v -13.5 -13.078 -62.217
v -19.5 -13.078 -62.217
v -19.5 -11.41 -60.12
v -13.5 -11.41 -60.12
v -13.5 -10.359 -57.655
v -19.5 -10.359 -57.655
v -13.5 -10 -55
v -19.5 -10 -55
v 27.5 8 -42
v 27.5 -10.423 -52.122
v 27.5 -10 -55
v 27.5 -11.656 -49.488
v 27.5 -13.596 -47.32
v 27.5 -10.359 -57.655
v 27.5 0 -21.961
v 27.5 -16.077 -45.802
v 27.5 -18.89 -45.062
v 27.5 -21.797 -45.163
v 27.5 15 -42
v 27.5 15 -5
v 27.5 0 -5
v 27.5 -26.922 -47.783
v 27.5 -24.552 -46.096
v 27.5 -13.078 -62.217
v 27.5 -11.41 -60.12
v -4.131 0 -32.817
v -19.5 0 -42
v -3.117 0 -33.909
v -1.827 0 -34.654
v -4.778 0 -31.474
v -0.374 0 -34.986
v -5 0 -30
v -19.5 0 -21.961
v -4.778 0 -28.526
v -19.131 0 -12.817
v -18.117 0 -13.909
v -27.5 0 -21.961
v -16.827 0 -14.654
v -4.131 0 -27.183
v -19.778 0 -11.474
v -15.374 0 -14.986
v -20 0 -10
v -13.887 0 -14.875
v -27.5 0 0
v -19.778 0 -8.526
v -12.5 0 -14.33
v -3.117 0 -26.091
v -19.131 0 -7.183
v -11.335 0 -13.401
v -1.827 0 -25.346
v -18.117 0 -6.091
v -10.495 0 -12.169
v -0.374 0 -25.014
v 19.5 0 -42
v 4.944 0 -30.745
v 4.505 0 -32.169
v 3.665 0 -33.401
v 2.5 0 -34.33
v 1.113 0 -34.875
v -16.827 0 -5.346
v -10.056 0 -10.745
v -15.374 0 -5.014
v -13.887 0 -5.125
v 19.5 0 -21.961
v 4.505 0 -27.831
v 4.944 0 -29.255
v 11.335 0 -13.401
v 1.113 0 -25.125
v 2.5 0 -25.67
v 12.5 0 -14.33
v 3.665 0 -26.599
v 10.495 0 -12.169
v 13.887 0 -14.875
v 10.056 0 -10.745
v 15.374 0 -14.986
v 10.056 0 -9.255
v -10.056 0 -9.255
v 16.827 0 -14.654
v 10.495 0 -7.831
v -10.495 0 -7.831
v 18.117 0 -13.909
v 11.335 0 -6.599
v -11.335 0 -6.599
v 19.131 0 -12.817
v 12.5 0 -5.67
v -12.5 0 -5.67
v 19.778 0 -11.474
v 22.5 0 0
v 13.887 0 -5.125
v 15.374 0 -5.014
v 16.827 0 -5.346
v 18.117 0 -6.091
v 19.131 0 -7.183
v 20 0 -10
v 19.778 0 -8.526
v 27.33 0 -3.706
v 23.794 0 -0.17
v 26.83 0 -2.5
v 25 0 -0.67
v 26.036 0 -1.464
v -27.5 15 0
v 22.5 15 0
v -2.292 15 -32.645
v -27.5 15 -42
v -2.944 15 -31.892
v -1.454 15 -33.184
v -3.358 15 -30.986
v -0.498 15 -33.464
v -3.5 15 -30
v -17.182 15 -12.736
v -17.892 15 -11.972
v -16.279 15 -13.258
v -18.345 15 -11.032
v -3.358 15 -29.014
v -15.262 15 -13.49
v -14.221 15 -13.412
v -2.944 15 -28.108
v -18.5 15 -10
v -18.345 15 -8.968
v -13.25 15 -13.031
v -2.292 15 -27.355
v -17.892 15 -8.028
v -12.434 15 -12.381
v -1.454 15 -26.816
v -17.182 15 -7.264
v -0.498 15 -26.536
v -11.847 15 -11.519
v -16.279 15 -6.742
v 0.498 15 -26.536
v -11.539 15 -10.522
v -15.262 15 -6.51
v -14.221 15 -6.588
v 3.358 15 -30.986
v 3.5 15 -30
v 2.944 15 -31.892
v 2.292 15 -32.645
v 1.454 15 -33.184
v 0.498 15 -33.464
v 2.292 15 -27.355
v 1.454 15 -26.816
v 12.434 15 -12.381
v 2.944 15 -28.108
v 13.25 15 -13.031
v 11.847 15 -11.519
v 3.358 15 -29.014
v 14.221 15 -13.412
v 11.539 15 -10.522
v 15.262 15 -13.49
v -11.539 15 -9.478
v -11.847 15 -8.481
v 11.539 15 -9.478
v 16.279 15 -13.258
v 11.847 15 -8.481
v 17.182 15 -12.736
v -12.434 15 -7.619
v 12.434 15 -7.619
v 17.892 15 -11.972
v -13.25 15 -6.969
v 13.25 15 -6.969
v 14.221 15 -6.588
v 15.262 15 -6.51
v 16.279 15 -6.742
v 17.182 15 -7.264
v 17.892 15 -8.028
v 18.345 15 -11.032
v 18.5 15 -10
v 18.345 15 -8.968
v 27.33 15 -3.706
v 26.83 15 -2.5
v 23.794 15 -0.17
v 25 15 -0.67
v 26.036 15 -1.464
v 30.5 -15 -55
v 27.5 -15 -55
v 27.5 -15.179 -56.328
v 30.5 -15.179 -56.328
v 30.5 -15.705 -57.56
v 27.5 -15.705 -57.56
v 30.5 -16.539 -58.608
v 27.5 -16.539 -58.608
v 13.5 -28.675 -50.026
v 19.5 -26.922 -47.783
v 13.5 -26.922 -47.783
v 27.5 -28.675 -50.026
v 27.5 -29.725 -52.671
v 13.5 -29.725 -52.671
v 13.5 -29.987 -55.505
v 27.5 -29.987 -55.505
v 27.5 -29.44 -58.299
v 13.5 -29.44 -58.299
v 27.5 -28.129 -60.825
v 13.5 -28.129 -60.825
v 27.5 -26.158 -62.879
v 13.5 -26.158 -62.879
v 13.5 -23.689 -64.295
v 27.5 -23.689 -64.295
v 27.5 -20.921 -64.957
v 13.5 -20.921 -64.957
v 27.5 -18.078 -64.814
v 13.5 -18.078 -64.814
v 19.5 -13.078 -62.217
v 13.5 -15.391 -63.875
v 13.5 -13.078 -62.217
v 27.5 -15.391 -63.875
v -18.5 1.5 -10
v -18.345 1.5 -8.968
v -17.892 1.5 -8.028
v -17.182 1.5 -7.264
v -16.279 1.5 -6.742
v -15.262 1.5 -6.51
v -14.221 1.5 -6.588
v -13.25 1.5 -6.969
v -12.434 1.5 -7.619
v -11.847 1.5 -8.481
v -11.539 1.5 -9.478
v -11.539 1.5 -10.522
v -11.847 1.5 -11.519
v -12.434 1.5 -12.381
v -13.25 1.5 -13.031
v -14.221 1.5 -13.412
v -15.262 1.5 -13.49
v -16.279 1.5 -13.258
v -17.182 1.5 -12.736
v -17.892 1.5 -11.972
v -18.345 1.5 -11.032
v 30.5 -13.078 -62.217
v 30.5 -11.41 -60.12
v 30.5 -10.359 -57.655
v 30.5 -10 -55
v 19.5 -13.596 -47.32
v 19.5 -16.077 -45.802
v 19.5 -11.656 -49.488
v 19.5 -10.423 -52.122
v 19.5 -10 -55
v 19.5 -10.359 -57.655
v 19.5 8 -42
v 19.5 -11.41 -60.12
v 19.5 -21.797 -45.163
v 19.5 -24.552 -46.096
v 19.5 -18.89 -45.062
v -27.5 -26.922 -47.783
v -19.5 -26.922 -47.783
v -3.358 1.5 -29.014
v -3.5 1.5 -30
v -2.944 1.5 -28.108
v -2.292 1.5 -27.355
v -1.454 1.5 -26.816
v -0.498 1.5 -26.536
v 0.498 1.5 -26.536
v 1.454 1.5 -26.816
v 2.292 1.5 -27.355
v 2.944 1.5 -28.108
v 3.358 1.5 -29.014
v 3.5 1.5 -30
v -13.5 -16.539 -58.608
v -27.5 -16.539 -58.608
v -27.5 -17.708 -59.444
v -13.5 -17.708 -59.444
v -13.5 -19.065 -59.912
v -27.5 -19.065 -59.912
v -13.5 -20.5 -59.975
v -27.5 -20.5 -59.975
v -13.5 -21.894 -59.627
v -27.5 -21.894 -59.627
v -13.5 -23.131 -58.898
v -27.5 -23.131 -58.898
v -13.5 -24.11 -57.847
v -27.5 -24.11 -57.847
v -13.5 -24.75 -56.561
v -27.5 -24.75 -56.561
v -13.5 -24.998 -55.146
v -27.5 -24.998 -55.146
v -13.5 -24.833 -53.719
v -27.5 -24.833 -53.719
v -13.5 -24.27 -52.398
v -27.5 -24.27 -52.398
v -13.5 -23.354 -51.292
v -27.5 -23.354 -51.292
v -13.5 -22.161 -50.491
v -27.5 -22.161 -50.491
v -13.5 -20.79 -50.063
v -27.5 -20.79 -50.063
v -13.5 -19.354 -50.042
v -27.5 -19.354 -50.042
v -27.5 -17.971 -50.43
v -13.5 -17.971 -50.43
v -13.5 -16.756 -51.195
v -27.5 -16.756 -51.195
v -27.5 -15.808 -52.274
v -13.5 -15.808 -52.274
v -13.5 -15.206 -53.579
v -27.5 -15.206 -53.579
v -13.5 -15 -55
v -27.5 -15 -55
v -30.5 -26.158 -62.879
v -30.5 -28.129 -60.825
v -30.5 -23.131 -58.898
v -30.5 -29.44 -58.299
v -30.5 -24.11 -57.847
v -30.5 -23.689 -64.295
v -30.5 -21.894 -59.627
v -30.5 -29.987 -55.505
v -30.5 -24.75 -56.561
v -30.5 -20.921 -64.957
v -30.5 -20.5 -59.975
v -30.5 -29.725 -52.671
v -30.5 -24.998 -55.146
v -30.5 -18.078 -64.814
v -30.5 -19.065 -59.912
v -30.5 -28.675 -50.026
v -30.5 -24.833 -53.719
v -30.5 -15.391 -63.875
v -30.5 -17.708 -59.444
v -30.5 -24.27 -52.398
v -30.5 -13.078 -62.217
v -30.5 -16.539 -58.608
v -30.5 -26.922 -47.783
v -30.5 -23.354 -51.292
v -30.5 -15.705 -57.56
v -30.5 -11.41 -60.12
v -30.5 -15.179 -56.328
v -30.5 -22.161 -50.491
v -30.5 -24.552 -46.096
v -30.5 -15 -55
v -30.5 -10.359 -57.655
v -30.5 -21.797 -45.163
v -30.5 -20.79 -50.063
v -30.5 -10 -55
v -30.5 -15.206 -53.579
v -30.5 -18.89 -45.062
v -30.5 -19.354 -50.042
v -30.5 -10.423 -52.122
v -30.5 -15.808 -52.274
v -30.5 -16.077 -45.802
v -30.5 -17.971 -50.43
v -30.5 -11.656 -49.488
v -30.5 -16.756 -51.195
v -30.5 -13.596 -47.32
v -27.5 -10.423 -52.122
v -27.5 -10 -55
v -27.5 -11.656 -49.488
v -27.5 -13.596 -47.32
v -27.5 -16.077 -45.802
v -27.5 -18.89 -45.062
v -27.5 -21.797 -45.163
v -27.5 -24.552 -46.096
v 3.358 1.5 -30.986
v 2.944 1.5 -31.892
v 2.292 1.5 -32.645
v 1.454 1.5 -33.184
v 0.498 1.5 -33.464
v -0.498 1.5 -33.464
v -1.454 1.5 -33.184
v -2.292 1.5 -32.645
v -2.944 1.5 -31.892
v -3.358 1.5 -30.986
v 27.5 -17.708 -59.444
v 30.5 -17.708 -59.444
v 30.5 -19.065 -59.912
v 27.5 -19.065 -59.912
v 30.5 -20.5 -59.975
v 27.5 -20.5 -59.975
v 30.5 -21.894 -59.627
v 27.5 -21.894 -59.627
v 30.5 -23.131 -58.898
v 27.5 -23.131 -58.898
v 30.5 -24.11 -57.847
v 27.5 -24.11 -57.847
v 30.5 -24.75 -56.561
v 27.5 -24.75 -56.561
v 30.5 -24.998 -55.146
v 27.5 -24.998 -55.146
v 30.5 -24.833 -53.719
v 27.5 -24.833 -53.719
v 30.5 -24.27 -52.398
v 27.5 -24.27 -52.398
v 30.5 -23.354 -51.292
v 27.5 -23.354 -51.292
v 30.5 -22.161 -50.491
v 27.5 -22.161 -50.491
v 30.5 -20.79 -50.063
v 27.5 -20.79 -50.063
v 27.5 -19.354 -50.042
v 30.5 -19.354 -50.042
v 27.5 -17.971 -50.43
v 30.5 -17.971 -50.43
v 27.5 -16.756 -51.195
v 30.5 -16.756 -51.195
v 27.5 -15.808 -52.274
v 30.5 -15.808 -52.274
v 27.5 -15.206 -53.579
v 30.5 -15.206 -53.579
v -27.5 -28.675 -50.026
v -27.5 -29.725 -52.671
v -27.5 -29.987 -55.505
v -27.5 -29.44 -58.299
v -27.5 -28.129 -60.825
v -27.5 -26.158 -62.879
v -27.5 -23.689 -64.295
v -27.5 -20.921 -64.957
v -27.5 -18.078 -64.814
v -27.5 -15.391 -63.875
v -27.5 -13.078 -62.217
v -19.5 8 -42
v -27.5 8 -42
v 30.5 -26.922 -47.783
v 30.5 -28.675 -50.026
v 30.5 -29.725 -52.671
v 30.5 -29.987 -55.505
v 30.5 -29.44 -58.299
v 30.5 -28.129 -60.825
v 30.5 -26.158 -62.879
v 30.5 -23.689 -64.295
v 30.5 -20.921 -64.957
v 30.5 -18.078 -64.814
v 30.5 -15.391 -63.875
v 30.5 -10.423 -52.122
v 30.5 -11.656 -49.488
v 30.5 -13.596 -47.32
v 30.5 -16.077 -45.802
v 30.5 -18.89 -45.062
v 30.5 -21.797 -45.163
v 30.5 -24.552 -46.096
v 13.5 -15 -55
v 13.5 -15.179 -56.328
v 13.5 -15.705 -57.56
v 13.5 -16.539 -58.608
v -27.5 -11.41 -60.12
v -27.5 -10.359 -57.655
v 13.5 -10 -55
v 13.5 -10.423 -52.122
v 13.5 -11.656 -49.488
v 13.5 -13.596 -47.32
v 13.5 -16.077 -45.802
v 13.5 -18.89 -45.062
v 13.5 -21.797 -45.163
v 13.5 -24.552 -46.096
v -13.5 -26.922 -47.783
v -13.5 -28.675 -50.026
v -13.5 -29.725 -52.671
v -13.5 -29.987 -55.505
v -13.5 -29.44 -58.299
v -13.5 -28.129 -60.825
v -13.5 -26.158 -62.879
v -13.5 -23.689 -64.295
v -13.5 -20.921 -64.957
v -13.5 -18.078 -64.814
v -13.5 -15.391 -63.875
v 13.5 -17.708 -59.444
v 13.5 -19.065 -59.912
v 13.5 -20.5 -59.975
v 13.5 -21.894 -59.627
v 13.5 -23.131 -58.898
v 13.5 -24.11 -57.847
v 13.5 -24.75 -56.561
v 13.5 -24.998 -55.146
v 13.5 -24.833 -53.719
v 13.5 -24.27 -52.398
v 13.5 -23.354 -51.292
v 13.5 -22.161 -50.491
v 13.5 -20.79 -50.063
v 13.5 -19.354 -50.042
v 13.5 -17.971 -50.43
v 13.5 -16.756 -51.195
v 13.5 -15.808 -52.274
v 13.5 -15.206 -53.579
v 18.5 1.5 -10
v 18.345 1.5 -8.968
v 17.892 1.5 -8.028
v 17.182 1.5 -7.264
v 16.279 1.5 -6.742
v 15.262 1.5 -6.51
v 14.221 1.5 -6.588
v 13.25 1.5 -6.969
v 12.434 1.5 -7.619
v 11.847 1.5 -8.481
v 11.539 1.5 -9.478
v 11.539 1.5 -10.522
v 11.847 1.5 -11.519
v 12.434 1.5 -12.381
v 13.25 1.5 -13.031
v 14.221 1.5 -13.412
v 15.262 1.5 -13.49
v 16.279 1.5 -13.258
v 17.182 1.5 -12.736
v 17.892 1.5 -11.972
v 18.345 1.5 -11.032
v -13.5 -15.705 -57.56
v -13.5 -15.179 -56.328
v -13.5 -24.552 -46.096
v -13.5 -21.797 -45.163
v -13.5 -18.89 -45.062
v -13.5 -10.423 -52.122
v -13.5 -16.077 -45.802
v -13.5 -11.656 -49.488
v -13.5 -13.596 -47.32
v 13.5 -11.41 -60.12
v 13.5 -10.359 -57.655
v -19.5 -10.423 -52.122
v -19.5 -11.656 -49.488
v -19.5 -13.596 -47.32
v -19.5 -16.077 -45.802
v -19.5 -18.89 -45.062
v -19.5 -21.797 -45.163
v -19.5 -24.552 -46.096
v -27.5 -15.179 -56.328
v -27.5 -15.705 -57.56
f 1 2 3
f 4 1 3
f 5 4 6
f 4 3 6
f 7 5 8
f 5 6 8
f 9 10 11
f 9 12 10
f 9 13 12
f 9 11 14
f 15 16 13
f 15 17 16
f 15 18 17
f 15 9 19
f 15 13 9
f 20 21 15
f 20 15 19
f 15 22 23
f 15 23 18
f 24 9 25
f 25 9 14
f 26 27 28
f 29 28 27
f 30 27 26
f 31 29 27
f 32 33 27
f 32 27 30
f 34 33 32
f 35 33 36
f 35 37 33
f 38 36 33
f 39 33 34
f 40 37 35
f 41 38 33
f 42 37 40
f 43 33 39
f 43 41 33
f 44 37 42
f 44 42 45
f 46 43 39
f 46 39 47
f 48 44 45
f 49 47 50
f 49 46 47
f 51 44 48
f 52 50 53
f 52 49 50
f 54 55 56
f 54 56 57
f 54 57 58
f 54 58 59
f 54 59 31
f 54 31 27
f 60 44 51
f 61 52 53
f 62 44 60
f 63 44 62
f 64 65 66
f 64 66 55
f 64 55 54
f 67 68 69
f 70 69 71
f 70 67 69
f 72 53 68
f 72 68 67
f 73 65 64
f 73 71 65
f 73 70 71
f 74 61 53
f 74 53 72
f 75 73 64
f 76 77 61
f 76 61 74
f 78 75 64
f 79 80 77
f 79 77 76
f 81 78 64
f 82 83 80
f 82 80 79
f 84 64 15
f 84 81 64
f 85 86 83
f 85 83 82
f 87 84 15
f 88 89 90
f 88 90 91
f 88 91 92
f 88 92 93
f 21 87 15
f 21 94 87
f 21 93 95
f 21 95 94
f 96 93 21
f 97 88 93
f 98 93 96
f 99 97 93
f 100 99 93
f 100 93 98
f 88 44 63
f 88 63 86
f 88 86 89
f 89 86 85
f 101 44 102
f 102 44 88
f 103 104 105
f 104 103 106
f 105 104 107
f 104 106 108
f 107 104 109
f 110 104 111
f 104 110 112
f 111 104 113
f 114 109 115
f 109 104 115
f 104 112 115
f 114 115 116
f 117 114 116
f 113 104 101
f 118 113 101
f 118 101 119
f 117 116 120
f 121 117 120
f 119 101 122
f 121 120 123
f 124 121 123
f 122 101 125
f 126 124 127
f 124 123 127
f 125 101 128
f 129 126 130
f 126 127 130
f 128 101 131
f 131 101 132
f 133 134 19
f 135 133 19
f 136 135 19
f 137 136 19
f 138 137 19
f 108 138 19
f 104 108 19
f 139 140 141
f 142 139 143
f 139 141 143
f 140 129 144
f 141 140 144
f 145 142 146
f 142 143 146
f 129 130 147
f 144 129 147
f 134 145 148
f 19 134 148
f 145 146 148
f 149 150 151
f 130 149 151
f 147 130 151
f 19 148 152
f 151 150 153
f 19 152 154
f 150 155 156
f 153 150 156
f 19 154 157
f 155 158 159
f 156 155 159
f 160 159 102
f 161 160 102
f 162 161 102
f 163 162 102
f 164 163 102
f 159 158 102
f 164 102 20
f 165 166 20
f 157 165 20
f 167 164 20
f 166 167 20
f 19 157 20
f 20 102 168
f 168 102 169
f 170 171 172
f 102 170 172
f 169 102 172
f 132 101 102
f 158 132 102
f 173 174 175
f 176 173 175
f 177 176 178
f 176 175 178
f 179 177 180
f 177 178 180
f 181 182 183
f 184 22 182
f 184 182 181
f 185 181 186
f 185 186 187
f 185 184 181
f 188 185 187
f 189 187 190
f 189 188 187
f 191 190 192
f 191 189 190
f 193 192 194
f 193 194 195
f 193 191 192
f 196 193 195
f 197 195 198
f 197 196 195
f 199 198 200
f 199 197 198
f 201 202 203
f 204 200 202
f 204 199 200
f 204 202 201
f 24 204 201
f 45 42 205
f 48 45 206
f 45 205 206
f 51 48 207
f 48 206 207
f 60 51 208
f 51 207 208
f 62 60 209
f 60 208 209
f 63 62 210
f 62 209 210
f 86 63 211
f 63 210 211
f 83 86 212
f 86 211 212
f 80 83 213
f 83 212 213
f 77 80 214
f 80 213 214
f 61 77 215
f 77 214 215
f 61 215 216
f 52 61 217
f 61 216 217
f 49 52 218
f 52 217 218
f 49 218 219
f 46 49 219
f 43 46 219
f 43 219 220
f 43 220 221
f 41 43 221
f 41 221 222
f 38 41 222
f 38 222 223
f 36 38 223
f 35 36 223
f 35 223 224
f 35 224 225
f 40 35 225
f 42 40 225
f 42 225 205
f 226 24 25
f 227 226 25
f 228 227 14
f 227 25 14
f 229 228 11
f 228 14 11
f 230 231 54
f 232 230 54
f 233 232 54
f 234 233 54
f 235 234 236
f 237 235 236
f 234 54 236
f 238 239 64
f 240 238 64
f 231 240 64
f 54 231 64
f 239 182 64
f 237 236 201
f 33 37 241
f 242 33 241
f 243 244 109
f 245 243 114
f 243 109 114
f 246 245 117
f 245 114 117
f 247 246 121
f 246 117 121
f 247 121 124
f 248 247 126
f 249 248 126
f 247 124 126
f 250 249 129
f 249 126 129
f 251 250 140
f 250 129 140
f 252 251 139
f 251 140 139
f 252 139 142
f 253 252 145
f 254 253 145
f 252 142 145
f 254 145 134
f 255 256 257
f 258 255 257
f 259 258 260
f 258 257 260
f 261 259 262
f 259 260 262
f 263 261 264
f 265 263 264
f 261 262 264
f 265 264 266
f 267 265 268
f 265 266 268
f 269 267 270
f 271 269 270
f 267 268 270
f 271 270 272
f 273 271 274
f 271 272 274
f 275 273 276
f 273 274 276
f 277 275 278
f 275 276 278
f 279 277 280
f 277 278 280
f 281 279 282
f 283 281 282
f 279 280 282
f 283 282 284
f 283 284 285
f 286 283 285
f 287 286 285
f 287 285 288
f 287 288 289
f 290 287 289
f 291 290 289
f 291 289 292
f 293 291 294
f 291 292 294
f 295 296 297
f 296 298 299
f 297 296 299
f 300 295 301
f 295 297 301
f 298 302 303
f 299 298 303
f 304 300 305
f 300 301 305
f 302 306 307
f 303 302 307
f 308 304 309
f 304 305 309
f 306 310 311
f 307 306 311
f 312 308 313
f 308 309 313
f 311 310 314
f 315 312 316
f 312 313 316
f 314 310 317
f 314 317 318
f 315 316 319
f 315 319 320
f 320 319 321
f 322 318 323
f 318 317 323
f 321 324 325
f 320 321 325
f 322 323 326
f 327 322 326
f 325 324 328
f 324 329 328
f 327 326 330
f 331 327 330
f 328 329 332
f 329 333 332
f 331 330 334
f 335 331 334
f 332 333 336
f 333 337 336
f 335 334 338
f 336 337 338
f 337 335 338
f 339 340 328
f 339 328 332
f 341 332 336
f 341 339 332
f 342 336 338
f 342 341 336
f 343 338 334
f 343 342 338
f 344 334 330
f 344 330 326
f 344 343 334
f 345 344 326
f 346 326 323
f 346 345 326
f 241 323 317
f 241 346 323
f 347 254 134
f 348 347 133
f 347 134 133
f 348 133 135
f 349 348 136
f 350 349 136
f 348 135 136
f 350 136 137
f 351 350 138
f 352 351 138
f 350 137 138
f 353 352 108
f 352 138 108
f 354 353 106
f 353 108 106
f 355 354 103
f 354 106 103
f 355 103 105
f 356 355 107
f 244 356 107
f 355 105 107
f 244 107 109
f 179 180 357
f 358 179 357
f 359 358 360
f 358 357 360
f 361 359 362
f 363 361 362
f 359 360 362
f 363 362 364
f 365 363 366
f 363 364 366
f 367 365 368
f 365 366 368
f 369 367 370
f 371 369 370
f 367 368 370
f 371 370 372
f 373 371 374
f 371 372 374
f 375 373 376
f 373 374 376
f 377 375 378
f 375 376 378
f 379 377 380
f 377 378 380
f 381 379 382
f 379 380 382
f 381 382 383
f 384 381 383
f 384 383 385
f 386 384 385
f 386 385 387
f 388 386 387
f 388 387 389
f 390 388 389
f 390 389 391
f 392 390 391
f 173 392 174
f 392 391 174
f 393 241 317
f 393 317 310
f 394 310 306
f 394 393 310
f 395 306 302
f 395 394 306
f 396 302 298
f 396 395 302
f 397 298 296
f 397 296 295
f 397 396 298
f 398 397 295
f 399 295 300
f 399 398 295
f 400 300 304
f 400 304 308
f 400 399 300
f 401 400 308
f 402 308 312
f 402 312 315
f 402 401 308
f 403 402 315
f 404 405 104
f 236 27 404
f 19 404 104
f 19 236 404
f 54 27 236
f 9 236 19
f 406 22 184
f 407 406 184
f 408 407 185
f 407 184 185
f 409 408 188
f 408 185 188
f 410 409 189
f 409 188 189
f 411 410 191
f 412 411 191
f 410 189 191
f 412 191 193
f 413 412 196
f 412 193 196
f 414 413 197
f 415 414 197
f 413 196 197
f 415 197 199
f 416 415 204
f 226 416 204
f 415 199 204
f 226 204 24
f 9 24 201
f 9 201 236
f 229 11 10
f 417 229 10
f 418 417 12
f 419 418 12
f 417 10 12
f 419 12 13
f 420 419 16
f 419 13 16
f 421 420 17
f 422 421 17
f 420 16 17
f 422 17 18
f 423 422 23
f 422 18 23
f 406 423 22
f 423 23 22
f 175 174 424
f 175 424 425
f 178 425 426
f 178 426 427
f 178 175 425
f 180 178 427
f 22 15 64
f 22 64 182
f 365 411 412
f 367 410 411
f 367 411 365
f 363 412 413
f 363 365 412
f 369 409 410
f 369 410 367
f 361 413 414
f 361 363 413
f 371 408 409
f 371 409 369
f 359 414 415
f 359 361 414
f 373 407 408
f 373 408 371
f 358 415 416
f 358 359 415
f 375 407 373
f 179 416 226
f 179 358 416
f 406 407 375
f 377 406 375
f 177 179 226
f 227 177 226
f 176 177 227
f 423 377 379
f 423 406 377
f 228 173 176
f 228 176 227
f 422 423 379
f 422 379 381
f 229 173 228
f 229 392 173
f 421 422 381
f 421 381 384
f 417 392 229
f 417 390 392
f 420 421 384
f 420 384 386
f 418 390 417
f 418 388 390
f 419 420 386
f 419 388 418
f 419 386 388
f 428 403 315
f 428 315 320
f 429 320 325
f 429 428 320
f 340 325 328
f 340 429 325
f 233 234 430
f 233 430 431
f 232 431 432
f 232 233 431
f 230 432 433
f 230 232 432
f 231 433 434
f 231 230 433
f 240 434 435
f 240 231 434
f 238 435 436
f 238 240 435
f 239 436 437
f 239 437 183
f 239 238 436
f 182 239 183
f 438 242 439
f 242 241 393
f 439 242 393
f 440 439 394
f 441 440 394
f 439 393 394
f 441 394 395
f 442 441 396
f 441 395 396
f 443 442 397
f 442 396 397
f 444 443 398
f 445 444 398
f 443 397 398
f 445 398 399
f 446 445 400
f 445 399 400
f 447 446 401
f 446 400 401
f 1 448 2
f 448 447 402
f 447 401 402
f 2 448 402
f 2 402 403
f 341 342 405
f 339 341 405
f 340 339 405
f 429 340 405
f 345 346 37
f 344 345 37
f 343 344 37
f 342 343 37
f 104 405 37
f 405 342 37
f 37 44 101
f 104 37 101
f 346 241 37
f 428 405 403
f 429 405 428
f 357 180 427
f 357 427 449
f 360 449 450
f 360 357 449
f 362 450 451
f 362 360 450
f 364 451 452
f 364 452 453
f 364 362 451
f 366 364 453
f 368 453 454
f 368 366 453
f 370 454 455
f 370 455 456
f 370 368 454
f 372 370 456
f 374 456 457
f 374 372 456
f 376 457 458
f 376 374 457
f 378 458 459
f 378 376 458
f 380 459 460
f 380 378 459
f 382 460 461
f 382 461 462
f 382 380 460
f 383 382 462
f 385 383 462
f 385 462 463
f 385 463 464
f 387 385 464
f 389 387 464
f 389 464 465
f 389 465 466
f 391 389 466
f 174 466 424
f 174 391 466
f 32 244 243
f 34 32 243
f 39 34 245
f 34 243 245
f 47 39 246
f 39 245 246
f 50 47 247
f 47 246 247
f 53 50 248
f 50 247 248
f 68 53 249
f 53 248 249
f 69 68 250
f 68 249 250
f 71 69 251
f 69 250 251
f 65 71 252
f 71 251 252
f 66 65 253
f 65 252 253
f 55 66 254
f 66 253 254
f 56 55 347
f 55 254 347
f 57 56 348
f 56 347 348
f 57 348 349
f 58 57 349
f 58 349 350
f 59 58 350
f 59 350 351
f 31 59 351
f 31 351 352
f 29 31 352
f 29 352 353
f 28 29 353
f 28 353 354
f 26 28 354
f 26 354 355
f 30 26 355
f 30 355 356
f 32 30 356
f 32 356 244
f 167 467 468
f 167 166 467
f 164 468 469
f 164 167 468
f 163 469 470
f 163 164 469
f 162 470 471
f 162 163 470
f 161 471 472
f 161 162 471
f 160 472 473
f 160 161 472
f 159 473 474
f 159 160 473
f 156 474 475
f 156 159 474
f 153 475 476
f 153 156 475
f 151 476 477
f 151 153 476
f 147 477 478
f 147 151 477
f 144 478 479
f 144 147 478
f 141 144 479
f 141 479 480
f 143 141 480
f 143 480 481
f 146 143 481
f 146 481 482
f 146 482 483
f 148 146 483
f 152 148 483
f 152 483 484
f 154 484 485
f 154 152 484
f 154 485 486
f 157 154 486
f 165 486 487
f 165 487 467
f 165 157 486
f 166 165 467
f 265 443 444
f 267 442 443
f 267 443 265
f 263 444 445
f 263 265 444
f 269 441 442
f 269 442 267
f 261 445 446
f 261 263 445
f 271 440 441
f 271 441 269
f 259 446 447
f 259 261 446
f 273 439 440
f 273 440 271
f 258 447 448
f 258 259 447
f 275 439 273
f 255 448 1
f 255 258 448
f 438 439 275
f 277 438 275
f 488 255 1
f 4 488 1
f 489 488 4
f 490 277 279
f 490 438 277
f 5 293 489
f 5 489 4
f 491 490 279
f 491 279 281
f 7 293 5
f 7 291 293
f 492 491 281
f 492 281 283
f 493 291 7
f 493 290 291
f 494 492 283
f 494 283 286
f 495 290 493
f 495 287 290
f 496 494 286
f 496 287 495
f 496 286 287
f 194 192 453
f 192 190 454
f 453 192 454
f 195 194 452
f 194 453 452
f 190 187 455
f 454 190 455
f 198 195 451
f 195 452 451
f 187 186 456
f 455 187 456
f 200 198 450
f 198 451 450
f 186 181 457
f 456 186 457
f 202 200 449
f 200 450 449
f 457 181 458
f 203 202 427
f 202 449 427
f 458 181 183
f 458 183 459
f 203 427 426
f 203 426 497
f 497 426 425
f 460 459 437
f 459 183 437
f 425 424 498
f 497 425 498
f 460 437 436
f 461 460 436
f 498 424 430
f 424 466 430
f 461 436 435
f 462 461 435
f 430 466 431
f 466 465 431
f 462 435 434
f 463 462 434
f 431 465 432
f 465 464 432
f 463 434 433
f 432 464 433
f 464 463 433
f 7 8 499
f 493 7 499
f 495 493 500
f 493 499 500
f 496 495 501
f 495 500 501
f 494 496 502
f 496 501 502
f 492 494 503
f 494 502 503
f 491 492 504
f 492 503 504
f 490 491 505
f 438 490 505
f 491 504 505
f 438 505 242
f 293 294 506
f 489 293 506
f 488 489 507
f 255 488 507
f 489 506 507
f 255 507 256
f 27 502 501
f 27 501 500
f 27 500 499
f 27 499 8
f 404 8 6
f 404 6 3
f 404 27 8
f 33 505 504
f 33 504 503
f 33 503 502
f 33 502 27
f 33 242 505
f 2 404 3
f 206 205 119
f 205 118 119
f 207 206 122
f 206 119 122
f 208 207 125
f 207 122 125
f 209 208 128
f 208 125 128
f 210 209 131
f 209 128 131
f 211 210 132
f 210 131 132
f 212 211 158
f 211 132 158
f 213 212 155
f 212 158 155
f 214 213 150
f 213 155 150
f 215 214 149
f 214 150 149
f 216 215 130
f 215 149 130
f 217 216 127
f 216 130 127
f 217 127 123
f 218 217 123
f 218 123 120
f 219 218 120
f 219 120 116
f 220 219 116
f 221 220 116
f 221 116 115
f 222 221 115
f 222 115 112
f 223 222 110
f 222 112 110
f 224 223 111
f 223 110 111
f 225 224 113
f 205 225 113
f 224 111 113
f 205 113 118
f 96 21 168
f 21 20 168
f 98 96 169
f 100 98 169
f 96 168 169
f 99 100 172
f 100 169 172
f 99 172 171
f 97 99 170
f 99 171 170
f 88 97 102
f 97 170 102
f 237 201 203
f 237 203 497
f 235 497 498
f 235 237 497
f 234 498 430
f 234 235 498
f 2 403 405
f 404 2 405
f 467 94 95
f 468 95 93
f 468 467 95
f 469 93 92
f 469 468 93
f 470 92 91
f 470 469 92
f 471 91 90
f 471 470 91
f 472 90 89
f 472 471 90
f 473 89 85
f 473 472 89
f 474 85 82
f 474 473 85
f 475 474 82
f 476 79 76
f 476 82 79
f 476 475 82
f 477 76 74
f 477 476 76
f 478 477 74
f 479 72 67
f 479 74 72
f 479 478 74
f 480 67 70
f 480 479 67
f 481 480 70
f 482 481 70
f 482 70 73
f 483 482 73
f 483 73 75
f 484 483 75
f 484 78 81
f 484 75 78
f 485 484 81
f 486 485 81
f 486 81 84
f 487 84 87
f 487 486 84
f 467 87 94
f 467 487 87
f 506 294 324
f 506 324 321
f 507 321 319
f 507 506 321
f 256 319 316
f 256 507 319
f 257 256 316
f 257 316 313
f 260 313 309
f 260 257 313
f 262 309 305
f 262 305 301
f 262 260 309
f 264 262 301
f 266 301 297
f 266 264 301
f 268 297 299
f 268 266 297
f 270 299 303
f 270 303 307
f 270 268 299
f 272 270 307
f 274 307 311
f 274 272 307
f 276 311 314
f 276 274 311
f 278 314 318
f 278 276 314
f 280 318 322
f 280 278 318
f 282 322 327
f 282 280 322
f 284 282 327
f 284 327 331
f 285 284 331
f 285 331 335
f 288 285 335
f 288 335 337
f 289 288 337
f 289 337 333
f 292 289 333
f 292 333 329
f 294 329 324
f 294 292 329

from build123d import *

# Parameters (mm, degrees)
F0_W           = 55
F0_H           = 42
F1_DEPTH       = 15
F3_DEPTH       = 8
F4_DEPTH       = 14
F4_DEPTH_BACK  = 3
F6_D           = 7
F6_CSINK_D     = 10
F6_CSINK_ANGLE = 90
F7_R           = 5


# Not quite as in the source:
# - a pattern or mirror of a feature is missing from the dataset's text; its kind, count and spacing are read off the source's solid


with BuildPart() as f1:
    # F0 (on Front) → F1 (new body)
    with BuildSketch(Plane.XZ):
        with Locations((0, -21)):
            Rectangle(F0_W, F0_H)
    extrude(amount=-F1_DEPTH)

    # F2 (on face) → F3 (join)
    with BuildSketch(Plane.YZ.offset(27.5)):
        with BuildLine():
            Line((0, -42), (0, -21.960586854))
            Line((0, -21.960586854), (-26.9221419573, -47.7830788612))
            ThreePointArc((-26.9221419573, -47.7830788612), (-16.0770814164, -45.8015919972), (-10, -55))
            ThreePointArc((-10, -55), (-10.8015919972, -58.9229185836), (-13.0778580427, -62.2169211388))
            Line((-13.0778580427, -62.2169211388), (8, -42))
            Line((8, -42), (0, -42))
        make_face()
    f3 = extrude(amount=-F3_DEPTH)

    # F3_copies: F3 across plane
    add(f3.mirror(Plane(origin=(0, 0, 0), x_dir=(0, 0, -1), z_dir=(-1, 0, 0))))

    # F2 (on face) → F4 (join, two sides)
    with BuildSketch(Plane.YZ.offset(27.5)) as f4_sk:
        with BuildLine():
            ThreePointArc((-10, -55), (-16.0770814164, -45.8015919972), (-26.9221419573, -47.7830788612))
            Line((-26.9221419573, -47.7830788612), (-23.4610709786, -51.3915394306))
            ThreePointArc((-23.4610709786, -51.3915394306), (-18.0385407082, -50.4007959986), (-15, -55))
            ThreePointArc((-15, -55), (-15.4007959986, -56.9614592918), (-16.5389290214, -58.6084605694))
            Line((-16.5389290214, -58.6084605694), (-13.0778580427, -62.2169211388))
            ThreePointArc((-13.0778580427, -62.2169211388), (-10.8015919972, -58.9229185836), (-10, -55))
        make_face()
        with BuildLine():
            Line((-23.4610709786, -51.3915394306), (-26.9221419573, -47.7830788612))
            ThreePointArc((-26.9221419573, -47.7830788612), (-27.2169211388, -61.9221419573), (-13.0778580427, -62.2169211388))
            Line((-13.0778580427, -62.2169211388), (-16.5389290214, -58.6084605694))
            ThreePointArc((-16.5389290214, -58.6084605694), (-23.6084605694, -58.4610709786), (-23.4610709786, -51.3915394306))
        make_face()
    f4 = extrude(amount=-F4_DEPTH) + extrude(f4_sk.sketch, amount=F4_DEPTH_BACK)

    # F4_copies: F4 across plane
    add(f4.mirror(Plane(origin=(0, 0, 0), x_dir=(0, 0, -1), z_dir=(-1, 0, 0))))

    # F6 (through all)
    with Locations(Plane.XZ):
        with Locations((-15, -10), (0, -30)):
            f6 = CounterSinkHole(F6_D / 2, F6_CSINK_D / 2, counter_sink_angle=F6_CSINK_ANGLE)

    # F6_copies: F6 across plane
    add(f6.mirror(Plane(origin=(0, 0, 0), x_dir=(0, 0, 1), z_dir=(1, 0, 0))), mode=Mode.SUBTRACT)

    # F7
    f7_edges = [f1.edges().sort_by_distance(p)[0] for p in [
        (27.5, 7.5, 0),
    ]]
    fillet(f7_edges, radius=F7_R)


solid = f1.part
